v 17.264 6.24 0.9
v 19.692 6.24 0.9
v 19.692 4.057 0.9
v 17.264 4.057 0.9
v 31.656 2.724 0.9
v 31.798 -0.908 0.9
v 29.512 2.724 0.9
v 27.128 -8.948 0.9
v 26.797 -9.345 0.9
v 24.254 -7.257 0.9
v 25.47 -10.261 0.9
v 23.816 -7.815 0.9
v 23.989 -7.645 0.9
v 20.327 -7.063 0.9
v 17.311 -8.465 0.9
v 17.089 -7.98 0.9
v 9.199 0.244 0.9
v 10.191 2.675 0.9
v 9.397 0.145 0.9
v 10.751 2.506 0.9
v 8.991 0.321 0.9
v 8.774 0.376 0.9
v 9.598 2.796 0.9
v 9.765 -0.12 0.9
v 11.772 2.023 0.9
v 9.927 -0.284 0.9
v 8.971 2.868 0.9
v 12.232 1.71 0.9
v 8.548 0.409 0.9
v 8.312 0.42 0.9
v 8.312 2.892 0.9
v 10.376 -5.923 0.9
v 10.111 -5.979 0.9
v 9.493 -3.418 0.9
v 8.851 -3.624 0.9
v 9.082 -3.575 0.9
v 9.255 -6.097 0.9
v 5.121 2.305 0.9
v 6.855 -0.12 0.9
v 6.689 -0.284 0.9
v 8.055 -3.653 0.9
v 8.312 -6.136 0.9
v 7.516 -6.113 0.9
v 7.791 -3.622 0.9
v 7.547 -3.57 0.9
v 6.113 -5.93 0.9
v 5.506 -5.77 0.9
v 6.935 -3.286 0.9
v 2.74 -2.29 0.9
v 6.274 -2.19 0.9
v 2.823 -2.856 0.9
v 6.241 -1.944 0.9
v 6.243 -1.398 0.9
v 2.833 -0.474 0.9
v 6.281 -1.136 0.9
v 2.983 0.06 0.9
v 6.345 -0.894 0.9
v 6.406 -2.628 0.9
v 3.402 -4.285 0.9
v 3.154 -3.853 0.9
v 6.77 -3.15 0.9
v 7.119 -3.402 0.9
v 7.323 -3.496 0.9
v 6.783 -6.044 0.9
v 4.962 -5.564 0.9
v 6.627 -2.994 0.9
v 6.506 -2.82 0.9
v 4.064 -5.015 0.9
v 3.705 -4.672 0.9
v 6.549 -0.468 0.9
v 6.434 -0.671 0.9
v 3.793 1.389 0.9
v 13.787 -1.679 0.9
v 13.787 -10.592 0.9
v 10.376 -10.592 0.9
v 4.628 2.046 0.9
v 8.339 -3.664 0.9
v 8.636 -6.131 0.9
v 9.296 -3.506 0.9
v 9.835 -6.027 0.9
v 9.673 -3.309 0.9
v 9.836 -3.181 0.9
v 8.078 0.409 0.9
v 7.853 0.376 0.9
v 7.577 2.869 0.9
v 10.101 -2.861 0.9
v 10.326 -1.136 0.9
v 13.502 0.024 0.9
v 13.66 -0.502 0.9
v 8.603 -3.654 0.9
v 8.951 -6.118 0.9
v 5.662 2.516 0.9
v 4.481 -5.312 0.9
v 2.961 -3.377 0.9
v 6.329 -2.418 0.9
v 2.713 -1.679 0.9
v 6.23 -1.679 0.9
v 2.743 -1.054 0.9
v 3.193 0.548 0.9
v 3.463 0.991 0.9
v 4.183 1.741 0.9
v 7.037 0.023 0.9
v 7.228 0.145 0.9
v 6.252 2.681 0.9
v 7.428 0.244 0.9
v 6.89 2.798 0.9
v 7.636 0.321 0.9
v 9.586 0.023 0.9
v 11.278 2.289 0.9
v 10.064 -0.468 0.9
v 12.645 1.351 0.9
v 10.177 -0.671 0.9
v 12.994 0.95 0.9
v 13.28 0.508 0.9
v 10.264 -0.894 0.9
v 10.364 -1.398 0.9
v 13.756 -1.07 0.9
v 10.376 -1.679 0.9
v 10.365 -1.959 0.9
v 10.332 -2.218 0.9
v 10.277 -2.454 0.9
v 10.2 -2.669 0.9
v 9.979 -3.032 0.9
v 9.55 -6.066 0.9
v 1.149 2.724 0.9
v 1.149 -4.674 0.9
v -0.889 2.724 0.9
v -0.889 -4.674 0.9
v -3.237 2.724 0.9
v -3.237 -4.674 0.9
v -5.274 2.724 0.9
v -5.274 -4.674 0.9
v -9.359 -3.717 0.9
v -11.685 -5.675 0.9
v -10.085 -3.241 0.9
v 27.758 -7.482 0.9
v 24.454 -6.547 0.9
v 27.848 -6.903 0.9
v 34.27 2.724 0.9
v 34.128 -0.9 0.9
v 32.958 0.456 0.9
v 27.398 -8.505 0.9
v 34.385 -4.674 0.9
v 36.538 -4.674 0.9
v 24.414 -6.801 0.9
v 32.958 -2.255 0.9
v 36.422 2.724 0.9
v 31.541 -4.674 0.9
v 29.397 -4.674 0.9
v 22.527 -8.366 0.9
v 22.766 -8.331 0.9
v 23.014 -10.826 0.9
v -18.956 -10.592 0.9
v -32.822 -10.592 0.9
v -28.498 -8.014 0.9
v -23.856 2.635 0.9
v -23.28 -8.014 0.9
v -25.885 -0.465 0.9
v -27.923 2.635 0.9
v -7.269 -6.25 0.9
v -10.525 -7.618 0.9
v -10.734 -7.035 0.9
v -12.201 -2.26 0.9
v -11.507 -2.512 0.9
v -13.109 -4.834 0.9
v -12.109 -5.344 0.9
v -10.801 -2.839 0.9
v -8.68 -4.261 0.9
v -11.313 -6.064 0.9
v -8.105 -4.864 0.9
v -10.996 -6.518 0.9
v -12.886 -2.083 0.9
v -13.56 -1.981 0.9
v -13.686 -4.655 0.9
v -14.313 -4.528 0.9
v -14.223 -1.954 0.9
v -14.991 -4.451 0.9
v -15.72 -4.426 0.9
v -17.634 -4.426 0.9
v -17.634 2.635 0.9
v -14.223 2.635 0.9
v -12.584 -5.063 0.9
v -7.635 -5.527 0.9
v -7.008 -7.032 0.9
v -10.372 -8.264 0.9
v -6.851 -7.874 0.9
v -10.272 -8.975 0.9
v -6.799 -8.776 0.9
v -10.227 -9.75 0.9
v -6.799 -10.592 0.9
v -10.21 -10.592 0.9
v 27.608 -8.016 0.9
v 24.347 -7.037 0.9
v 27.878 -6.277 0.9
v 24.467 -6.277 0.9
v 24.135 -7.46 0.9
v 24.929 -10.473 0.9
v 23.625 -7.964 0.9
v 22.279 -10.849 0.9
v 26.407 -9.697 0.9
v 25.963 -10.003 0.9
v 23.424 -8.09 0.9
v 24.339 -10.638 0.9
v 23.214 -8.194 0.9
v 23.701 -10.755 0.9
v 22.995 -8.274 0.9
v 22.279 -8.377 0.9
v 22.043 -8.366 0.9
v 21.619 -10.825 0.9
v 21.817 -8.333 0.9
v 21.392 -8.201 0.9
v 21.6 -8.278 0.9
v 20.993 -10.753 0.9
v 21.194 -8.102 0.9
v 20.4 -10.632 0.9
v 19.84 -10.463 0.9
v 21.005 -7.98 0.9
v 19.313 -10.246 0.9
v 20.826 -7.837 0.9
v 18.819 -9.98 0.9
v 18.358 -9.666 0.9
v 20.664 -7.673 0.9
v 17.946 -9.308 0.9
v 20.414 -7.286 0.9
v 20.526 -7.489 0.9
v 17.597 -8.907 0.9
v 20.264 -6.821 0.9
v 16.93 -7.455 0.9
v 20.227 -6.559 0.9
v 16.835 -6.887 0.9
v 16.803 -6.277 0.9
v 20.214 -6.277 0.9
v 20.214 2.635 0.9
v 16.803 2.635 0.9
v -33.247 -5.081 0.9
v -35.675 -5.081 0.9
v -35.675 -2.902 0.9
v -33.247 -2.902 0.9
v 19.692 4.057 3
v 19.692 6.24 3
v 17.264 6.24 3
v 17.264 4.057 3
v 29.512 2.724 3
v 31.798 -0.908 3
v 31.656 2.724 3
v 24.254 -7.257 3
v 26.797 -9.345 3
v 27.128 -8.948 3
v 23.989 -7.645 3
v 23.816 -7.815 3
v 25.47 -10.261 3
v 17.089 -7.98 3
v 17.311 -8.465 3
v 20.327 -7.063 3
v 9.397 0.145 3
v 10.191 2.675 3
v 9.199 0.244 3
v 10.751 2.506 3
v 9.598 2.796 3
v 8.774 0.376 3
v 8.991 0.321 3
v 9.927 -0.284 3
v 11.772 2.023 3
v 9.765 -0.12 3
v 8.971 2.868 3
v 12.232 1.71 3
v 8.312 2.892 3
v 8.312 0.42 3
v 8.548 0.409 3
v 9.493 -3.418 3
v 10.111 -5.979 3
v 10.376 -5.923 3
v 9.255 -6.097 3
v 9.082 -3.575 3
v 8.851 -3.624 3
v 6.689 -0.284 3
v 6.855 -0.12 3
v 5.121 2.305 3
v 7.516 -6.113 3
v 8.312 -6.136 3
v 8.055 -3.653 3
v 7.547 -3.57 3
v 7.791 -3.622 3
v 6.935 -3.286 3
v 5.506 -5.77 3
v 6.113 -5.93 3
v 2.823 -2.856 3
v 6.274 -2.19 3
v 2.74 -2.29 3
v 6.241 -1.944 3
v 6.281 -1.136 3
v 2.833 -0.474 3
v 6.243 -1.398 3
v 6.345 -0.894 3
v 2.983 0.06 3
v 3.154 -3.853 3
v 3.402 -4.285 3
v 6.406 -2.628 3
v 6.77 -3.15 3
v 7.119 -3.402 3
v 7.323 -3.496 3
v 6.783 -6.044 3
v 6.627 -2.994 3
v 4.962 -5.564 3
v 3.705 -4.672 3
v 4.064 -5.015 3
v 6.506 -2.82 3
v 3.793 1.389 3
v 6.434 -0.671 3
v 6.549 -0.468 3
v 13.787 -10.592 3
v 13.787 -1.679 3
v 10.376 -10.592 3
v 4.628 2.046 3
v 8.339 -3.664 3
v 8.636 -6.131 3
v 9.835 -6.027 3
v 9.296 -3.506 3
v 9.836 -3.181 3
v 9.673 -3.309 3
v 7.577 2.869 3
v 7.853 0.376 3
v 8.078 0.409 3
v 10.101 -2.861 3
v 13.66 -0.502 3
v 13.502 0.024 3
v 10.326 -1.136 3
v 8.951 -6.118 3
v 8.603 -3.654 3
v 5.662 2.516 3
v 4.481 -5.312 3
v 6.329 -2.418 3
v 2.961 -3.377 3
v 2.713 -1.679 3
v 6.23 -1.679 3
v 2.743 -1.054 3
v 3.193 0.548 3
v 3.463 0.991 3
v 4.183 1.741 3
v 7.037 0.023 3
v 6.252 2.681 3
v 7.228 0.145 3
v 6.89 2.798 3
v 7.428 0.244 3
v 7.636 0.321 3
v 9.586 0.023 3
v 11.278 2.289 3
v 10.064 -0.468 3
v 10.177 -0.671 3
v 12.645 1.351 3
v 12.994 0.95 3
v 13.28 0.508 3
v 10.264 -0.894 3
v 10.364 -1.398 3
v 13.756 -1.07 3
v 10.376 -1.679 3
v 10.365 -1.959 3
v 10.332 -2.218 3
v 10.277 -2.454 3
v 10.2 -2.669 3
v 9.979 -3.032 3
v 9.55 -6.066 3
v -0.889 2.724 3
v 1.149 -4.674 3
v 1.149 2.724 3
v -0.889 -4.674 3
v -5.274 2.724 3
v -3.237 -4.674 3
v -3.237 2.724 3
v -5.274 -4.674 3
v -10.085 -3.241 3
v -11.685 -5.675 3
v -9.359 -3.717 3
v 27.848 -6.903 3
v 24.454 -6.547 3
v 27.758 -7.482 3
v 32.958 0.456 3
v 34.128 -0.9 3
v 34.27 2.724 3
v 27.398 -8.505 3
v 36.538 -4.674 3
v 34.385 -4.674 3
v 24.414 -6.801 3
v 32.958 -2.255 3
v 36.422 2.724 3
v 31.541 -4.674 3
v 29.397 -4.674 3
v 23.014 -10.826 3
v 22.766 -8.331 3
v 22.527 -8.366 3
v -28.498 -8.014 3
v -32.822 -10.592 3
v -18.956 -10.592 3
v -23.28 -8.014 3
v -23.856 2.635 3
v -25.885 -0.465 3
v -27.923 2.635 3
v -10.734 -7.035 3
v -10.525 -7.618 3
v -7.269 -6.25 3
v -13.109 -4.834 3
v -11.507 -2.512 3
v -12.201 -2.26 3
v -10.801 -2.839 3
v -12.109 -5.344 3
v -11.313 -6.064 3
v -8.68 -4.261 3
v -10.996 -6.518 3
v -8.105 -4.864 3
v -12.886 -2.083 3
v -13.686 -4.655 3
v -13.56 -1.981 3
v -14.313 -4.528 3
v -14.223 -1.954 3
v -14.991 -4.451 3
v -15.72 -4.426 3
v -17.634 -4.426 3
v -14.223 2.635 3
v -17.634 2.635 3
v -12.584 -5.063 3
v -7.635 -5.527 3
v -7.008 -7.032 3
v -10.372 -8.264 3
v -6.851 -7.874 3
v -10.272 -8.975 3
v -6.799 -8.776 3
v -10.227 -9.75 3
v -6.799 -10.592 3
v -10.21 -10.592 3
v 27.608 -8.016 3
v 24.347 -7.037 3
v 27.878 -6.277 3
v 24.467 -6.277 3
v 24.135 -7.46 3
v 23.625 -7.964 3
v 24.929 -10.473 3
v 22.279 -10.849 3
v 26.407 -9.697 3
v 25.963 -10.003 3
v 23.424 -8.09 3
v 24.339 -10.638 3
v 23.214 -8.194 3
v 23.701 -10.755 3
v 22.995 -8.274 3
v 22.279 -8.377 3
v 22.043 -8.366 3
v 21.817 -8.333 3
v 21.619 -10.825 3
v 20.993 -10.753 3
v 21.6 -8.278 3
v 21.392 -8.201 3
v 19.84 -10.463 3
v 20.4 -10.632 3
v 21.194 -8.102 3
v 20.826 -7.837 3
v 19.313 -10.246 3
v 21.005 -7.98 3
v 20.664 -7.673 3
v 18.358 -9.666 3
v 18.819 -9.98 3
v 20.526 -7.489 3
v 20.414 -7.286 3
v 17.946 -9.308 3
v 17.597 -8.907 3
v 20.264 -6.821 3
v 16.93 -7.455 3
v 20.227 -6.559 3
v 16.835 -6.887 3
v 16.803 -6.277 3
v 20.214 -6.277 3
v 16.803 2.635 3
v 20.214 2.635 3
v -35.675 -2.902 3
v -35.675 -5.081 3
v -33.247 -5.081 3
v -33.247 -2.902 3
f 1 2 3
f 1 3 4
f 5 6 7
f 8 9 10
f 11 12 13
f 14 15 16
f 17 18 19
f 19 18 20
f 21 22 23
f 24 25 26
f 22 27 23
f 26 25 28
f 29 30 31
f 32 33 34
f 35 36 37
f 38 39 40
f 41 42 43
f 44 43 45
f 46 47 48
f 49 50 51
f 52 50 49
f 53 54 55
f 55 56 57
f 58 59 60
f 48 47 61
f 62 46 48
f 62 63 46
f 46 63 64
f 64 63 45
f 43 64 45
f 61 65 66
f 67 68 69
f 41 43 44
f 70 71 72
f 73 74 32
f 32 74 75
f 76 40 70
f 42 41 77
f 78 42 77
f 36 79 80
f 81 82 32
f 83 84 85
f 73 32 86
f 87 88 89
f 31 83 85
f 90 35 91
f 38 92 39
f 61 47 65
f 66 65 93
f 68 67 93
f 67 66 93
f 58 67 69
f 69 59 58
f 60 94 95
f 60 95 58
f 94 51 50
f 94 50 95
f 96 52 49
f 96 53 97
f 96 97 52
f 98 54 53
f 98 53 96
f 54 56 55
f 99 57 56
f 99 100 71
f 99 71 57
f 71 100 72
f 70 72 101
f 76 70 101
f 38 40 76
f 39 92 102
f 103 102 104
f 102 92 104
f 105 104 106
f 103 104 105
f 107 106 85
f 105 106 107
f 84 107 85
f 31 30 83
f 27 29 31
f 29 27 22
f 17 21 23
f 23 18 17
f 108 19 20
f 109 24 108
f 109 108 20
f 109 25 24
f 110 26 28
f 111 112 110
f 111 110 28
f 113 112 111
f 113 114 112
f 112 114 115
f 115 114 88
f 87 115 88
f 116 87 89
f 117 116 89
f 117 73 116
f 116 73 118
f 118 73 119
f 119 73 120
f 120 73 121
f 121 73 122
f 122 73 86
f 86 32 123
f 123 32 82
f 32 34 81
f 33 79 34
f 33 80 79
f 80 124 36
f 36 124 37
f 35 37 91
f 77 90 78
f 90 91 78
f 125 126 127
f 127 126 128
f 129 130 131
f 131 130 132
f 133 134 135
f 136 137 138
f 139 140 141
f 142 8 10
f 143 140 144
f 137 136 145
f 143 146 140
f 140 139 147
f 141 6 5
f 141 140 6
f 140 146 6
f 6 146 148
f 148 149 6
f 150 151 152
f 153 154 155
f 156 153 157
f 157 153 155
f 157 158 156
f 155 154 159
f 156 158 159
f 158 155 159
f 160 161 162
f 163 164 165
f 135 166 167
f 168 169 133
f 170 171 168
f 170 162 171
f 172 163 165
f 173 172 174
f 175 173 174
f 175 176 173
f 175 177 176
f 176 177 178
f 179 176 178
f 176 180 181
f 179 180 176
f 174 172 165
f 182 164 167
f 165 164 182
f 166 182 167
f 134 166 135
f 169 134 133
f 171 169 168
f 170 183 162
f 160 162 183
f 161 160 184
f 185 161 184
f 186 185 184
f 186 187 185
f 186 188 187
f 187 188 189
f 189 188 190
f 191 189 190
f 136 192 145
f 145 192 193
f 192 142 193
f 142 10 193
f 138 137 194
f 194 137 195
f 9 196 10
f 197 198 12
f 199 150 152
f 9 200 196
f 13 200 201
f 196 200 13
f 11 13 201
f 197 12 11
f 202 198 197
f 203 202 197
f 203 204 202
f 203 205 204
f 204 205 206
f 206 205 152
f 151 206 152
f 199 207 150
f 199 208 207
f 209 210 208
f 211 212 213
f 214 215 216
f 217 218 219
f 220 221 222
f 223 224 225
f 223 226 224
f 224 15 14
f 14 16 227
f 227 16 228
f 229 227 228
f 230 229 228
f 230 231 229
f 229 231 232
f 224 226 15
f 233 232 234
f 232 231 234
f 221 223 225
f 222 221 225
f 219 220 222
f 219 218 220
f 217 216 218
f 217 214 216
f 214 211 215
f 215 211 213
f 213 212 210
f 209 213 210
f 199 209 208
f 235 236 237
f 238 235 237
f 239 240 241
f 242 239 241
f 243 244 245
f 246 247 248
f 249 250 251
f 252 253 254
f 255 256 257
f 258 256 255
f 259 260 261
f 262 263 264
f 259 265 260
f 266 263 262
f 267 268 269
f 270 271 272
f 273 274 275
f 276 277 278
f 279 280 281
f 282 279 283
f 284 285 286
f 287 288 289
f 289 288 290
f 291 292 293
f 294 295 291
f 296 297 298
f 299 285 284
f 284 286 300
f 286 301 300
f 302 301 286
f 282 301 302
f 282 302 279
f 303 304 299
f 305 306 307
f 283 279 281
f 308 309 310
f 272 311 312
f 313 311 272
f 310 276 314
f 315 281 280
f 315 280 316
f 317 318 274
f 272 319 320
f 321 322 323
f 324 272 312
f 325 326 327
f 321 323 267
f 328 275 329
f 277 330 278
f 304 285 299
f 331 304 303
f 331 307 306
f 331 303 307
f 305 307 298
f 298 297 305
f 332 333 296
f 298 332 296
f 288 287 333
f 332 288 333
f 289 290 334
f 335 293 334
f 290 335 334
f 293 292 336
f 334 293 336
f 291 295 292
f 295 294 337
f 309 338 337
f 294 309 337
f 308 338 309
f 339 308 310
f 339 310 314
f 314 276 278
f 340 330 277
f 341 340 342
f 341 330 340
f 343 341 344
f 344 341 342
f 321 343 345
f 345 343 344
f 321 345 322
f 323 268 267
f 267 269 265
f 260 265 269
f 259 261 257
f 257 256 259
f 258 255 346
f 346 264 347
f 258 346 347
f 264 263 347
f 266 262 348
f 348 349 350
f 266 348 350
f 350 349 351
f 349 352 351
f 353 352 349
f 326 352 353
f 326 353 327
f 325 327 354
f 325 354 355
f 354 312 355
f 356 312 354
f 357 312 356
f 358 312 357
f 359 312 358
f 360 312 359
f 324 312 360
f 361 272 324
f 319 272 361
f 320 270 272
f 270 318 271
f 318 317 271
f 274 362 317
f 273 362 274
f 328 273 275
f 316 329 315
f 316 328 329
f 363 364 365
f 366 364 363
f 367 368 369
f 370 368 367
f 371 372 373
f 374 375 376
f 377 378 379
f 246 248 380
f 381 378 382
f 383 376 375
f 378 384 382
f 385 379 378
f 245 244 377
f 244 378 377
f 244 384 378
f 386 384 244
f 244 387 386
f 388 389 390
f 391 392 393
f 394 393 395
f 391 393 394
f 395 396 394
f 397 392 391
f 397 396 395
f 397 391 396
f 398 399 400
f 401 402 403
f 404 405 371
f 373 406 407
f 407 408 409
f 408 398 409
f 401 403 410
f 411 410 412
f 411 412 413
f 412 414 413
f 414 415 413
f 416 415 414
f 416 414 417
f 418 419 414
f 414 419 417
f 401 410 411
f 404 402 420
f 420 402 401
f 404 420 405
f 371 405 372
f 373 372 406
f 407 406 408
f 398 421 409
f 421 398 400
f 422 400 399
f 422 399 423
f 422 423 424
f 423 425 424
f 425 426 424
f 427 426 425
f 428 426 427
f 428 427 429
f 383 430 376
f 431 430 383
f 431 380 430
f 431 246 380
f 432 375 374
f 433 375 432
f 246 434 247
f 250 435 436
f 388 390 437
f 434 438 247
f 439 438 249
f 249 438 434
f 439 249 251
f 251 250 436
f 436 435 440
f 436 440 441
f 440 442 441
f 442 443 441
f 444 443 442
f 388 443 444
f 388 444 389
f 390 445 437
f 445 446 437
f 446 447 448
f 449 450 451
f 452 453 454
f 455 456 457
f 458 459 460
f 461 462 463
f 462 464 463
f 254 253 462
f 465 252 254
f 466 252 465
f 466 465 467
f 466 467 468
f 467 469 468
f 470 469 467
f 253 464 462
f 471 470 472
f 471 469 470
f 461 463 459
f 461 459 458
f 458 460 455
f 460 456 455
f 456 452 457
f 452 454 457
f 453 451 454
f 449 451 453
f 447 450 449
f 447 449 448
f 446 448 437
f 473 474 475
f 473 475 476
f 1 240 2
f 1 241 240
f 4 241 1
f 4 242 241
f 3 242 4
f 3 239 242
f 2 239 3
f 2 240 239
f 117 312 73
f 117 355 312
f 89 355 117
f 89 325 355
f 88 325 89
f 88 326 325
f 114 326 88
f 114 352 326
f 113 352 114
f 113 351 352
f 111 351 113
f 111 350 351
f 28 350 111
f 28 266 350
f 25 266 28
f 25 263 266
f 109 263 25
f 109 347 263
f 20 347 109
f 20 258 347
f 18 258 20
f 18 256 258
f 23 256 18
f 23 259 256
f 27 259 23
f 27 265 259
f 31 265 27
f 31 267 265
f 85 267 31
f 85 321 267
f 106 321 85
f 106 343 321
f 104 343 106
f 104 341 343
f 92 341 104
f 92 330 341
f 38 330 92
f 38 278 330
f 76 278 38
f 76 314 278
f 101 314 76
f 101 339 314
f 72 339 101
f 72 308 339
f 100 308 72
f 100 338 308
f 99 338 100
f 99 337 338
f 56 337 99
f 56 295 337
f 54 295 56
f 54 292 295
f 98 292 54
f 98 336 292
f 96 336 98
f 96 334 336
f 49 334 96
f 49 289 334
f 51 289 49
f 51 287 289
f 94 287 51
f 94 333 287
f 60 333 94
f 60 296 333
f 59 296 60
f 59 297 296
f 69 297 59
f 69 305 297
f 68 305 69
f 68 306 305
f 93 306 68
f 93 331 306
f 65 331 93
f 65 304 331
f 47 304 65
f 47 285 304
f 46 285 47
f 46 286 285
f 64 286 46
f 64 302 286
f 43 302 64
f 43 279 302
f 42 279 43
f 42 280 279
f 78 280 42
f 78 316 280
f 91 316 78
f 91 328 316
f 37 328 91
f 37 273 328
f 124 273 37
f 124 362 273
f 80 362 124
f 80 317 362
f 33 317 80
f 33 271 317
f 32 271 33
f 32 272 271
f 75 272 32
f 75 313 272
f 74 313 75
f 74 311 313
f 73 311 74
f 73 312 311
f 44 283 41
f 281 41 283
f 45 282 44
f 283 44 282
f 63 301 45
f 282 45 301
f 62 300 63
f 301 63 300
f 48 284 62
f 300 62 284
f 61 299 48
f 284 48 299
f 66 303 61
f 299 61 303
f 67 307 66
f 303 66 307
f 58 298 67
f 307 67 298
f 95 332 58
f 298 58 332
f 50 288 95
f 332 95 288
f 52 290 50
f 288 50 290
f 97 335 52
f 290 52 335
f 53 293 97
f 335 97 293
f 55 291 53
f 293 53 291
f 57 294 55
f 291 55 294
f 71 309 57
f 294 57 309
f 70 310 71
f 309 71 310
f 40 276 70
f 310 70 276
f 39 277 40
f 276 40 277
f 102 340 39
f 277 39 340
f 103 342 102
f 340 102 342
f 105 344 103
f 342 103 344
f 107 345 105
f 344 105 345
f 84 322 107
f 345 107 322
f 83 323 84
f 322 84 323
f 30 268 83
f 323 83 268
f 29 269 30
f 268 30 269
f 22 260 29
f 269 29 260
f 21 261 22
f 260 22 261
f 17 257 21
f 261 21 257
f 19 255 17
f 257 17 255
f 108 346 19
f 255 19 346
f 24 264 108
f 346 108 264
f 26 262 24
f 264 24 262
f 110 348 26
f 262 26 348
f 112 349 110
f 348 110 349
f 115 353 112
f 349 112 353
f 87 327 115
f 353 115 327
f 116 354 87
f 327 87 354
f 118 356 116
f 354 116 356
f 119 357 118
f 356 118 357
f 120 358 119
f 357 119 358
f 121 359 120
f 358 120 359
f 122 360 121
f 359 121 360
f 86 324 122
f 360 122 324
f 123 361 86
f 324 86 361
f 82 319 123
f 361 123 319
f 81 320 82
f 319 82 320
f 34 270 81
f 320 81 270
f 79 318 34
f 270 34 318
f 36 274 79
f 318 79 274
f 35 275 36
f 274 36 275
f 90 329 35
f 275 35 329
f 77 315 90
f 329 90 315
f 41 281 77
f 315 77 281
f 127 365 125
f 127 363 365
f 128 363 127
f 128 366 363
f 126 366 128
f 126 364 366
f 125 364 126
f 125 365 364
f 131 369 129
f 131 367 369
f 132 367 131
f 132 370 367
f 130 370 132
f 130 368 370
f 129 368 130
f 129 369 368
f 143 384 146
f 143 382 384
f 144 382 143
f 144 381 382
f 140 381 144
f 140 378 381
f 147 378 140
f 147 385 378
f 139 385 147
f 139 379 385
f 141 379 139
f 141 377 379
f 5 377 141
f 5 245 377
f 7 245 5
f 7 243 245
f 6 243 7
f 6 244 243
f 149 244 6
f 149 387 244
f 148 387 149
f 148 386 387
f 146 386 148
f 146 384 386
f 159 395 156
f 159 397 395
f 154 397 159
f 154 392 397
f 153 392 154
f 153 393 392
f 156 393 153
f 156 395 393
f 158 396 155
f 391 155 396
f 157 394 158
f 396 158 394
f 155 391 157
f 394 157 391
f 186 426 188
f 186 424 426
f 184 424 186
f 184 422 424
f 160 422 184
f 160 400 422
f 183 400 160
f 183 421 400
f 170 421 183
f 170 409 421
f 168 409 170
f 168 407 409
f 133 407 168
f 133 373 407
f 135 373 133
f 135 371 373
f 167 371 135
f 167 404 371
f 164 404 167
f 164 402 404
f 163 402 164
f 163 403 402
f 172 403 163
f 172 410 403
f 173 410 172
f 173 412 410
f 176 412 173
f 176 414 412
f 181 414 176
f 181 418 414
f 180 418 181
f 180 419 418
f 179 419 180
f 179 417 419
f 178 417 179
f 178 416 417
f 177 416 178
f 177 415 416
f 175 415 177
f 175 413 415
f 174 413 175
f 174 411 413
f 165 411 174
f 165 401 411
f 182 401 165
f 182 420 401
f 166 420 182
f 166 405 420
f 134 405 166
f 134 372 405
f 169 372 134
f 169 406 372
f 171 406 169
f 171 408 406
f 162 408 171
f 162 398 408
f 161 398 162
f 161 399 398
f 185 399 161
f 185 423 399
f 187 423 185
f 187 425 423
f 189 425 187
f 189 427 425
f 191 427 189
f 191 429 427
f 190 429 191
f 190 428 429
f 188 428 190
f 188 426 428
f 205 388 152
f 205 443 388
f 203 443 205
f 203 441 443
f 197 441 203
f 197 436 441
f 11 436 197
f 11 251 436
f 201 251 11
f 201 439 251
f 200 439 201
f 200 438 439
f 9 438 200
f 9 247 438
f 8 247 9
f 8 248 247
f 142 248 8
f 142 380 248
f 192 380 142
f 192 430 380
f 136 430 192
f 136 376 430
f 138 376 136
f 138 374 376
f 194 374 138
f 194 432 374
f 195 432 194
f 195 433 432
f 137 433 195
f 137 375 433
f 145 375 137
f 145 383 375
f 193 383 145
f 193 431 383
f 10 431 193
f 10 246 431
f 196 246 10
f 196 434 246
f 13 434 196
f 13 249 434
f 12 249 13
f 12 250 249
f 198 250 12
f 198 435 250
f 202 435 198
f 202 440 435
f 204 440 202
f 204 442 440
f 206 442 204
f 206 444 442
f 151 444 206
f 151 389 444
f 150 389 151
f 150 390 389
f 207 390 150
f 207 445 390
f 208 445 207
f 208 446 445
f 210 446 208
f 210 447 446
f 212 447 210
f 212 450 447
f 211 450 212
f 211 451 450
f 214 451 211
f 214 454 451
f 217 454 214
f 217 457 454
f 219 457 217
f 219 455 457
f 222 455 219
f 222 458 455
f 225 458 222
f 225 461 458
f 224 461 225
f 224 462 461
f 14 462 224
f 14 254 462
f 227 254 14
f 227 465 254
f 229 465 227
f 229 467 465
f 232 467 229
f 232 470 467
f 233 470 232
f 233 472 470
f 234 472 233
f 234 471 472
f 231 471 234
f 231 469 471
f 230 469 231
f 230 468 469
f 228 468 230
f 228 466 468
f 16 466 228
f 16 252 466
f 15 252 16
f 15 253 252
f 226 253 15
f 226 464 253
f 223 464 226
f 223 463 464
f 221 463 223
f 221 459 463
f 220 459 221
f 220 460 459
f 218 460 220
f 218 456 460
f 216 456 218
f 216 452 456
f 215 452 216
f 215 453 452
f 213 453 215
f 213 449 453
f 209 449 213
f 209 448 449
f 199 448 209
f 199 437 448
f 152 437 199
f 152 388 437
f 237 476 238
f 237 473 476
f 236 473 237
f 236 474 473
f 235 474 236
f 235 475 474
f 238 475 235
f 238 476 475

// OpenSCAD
$fn = 48;
  // syllabics (overlaid on icon, tallest)
  translate([0, -2.500, 0.900]) linear_extrude(height=2.100) text("ᐎᓴᐦᑫᒑᕽ", size=13.065, halign="center", valign="center", font="Euphemia UCAS:style=Bold");
